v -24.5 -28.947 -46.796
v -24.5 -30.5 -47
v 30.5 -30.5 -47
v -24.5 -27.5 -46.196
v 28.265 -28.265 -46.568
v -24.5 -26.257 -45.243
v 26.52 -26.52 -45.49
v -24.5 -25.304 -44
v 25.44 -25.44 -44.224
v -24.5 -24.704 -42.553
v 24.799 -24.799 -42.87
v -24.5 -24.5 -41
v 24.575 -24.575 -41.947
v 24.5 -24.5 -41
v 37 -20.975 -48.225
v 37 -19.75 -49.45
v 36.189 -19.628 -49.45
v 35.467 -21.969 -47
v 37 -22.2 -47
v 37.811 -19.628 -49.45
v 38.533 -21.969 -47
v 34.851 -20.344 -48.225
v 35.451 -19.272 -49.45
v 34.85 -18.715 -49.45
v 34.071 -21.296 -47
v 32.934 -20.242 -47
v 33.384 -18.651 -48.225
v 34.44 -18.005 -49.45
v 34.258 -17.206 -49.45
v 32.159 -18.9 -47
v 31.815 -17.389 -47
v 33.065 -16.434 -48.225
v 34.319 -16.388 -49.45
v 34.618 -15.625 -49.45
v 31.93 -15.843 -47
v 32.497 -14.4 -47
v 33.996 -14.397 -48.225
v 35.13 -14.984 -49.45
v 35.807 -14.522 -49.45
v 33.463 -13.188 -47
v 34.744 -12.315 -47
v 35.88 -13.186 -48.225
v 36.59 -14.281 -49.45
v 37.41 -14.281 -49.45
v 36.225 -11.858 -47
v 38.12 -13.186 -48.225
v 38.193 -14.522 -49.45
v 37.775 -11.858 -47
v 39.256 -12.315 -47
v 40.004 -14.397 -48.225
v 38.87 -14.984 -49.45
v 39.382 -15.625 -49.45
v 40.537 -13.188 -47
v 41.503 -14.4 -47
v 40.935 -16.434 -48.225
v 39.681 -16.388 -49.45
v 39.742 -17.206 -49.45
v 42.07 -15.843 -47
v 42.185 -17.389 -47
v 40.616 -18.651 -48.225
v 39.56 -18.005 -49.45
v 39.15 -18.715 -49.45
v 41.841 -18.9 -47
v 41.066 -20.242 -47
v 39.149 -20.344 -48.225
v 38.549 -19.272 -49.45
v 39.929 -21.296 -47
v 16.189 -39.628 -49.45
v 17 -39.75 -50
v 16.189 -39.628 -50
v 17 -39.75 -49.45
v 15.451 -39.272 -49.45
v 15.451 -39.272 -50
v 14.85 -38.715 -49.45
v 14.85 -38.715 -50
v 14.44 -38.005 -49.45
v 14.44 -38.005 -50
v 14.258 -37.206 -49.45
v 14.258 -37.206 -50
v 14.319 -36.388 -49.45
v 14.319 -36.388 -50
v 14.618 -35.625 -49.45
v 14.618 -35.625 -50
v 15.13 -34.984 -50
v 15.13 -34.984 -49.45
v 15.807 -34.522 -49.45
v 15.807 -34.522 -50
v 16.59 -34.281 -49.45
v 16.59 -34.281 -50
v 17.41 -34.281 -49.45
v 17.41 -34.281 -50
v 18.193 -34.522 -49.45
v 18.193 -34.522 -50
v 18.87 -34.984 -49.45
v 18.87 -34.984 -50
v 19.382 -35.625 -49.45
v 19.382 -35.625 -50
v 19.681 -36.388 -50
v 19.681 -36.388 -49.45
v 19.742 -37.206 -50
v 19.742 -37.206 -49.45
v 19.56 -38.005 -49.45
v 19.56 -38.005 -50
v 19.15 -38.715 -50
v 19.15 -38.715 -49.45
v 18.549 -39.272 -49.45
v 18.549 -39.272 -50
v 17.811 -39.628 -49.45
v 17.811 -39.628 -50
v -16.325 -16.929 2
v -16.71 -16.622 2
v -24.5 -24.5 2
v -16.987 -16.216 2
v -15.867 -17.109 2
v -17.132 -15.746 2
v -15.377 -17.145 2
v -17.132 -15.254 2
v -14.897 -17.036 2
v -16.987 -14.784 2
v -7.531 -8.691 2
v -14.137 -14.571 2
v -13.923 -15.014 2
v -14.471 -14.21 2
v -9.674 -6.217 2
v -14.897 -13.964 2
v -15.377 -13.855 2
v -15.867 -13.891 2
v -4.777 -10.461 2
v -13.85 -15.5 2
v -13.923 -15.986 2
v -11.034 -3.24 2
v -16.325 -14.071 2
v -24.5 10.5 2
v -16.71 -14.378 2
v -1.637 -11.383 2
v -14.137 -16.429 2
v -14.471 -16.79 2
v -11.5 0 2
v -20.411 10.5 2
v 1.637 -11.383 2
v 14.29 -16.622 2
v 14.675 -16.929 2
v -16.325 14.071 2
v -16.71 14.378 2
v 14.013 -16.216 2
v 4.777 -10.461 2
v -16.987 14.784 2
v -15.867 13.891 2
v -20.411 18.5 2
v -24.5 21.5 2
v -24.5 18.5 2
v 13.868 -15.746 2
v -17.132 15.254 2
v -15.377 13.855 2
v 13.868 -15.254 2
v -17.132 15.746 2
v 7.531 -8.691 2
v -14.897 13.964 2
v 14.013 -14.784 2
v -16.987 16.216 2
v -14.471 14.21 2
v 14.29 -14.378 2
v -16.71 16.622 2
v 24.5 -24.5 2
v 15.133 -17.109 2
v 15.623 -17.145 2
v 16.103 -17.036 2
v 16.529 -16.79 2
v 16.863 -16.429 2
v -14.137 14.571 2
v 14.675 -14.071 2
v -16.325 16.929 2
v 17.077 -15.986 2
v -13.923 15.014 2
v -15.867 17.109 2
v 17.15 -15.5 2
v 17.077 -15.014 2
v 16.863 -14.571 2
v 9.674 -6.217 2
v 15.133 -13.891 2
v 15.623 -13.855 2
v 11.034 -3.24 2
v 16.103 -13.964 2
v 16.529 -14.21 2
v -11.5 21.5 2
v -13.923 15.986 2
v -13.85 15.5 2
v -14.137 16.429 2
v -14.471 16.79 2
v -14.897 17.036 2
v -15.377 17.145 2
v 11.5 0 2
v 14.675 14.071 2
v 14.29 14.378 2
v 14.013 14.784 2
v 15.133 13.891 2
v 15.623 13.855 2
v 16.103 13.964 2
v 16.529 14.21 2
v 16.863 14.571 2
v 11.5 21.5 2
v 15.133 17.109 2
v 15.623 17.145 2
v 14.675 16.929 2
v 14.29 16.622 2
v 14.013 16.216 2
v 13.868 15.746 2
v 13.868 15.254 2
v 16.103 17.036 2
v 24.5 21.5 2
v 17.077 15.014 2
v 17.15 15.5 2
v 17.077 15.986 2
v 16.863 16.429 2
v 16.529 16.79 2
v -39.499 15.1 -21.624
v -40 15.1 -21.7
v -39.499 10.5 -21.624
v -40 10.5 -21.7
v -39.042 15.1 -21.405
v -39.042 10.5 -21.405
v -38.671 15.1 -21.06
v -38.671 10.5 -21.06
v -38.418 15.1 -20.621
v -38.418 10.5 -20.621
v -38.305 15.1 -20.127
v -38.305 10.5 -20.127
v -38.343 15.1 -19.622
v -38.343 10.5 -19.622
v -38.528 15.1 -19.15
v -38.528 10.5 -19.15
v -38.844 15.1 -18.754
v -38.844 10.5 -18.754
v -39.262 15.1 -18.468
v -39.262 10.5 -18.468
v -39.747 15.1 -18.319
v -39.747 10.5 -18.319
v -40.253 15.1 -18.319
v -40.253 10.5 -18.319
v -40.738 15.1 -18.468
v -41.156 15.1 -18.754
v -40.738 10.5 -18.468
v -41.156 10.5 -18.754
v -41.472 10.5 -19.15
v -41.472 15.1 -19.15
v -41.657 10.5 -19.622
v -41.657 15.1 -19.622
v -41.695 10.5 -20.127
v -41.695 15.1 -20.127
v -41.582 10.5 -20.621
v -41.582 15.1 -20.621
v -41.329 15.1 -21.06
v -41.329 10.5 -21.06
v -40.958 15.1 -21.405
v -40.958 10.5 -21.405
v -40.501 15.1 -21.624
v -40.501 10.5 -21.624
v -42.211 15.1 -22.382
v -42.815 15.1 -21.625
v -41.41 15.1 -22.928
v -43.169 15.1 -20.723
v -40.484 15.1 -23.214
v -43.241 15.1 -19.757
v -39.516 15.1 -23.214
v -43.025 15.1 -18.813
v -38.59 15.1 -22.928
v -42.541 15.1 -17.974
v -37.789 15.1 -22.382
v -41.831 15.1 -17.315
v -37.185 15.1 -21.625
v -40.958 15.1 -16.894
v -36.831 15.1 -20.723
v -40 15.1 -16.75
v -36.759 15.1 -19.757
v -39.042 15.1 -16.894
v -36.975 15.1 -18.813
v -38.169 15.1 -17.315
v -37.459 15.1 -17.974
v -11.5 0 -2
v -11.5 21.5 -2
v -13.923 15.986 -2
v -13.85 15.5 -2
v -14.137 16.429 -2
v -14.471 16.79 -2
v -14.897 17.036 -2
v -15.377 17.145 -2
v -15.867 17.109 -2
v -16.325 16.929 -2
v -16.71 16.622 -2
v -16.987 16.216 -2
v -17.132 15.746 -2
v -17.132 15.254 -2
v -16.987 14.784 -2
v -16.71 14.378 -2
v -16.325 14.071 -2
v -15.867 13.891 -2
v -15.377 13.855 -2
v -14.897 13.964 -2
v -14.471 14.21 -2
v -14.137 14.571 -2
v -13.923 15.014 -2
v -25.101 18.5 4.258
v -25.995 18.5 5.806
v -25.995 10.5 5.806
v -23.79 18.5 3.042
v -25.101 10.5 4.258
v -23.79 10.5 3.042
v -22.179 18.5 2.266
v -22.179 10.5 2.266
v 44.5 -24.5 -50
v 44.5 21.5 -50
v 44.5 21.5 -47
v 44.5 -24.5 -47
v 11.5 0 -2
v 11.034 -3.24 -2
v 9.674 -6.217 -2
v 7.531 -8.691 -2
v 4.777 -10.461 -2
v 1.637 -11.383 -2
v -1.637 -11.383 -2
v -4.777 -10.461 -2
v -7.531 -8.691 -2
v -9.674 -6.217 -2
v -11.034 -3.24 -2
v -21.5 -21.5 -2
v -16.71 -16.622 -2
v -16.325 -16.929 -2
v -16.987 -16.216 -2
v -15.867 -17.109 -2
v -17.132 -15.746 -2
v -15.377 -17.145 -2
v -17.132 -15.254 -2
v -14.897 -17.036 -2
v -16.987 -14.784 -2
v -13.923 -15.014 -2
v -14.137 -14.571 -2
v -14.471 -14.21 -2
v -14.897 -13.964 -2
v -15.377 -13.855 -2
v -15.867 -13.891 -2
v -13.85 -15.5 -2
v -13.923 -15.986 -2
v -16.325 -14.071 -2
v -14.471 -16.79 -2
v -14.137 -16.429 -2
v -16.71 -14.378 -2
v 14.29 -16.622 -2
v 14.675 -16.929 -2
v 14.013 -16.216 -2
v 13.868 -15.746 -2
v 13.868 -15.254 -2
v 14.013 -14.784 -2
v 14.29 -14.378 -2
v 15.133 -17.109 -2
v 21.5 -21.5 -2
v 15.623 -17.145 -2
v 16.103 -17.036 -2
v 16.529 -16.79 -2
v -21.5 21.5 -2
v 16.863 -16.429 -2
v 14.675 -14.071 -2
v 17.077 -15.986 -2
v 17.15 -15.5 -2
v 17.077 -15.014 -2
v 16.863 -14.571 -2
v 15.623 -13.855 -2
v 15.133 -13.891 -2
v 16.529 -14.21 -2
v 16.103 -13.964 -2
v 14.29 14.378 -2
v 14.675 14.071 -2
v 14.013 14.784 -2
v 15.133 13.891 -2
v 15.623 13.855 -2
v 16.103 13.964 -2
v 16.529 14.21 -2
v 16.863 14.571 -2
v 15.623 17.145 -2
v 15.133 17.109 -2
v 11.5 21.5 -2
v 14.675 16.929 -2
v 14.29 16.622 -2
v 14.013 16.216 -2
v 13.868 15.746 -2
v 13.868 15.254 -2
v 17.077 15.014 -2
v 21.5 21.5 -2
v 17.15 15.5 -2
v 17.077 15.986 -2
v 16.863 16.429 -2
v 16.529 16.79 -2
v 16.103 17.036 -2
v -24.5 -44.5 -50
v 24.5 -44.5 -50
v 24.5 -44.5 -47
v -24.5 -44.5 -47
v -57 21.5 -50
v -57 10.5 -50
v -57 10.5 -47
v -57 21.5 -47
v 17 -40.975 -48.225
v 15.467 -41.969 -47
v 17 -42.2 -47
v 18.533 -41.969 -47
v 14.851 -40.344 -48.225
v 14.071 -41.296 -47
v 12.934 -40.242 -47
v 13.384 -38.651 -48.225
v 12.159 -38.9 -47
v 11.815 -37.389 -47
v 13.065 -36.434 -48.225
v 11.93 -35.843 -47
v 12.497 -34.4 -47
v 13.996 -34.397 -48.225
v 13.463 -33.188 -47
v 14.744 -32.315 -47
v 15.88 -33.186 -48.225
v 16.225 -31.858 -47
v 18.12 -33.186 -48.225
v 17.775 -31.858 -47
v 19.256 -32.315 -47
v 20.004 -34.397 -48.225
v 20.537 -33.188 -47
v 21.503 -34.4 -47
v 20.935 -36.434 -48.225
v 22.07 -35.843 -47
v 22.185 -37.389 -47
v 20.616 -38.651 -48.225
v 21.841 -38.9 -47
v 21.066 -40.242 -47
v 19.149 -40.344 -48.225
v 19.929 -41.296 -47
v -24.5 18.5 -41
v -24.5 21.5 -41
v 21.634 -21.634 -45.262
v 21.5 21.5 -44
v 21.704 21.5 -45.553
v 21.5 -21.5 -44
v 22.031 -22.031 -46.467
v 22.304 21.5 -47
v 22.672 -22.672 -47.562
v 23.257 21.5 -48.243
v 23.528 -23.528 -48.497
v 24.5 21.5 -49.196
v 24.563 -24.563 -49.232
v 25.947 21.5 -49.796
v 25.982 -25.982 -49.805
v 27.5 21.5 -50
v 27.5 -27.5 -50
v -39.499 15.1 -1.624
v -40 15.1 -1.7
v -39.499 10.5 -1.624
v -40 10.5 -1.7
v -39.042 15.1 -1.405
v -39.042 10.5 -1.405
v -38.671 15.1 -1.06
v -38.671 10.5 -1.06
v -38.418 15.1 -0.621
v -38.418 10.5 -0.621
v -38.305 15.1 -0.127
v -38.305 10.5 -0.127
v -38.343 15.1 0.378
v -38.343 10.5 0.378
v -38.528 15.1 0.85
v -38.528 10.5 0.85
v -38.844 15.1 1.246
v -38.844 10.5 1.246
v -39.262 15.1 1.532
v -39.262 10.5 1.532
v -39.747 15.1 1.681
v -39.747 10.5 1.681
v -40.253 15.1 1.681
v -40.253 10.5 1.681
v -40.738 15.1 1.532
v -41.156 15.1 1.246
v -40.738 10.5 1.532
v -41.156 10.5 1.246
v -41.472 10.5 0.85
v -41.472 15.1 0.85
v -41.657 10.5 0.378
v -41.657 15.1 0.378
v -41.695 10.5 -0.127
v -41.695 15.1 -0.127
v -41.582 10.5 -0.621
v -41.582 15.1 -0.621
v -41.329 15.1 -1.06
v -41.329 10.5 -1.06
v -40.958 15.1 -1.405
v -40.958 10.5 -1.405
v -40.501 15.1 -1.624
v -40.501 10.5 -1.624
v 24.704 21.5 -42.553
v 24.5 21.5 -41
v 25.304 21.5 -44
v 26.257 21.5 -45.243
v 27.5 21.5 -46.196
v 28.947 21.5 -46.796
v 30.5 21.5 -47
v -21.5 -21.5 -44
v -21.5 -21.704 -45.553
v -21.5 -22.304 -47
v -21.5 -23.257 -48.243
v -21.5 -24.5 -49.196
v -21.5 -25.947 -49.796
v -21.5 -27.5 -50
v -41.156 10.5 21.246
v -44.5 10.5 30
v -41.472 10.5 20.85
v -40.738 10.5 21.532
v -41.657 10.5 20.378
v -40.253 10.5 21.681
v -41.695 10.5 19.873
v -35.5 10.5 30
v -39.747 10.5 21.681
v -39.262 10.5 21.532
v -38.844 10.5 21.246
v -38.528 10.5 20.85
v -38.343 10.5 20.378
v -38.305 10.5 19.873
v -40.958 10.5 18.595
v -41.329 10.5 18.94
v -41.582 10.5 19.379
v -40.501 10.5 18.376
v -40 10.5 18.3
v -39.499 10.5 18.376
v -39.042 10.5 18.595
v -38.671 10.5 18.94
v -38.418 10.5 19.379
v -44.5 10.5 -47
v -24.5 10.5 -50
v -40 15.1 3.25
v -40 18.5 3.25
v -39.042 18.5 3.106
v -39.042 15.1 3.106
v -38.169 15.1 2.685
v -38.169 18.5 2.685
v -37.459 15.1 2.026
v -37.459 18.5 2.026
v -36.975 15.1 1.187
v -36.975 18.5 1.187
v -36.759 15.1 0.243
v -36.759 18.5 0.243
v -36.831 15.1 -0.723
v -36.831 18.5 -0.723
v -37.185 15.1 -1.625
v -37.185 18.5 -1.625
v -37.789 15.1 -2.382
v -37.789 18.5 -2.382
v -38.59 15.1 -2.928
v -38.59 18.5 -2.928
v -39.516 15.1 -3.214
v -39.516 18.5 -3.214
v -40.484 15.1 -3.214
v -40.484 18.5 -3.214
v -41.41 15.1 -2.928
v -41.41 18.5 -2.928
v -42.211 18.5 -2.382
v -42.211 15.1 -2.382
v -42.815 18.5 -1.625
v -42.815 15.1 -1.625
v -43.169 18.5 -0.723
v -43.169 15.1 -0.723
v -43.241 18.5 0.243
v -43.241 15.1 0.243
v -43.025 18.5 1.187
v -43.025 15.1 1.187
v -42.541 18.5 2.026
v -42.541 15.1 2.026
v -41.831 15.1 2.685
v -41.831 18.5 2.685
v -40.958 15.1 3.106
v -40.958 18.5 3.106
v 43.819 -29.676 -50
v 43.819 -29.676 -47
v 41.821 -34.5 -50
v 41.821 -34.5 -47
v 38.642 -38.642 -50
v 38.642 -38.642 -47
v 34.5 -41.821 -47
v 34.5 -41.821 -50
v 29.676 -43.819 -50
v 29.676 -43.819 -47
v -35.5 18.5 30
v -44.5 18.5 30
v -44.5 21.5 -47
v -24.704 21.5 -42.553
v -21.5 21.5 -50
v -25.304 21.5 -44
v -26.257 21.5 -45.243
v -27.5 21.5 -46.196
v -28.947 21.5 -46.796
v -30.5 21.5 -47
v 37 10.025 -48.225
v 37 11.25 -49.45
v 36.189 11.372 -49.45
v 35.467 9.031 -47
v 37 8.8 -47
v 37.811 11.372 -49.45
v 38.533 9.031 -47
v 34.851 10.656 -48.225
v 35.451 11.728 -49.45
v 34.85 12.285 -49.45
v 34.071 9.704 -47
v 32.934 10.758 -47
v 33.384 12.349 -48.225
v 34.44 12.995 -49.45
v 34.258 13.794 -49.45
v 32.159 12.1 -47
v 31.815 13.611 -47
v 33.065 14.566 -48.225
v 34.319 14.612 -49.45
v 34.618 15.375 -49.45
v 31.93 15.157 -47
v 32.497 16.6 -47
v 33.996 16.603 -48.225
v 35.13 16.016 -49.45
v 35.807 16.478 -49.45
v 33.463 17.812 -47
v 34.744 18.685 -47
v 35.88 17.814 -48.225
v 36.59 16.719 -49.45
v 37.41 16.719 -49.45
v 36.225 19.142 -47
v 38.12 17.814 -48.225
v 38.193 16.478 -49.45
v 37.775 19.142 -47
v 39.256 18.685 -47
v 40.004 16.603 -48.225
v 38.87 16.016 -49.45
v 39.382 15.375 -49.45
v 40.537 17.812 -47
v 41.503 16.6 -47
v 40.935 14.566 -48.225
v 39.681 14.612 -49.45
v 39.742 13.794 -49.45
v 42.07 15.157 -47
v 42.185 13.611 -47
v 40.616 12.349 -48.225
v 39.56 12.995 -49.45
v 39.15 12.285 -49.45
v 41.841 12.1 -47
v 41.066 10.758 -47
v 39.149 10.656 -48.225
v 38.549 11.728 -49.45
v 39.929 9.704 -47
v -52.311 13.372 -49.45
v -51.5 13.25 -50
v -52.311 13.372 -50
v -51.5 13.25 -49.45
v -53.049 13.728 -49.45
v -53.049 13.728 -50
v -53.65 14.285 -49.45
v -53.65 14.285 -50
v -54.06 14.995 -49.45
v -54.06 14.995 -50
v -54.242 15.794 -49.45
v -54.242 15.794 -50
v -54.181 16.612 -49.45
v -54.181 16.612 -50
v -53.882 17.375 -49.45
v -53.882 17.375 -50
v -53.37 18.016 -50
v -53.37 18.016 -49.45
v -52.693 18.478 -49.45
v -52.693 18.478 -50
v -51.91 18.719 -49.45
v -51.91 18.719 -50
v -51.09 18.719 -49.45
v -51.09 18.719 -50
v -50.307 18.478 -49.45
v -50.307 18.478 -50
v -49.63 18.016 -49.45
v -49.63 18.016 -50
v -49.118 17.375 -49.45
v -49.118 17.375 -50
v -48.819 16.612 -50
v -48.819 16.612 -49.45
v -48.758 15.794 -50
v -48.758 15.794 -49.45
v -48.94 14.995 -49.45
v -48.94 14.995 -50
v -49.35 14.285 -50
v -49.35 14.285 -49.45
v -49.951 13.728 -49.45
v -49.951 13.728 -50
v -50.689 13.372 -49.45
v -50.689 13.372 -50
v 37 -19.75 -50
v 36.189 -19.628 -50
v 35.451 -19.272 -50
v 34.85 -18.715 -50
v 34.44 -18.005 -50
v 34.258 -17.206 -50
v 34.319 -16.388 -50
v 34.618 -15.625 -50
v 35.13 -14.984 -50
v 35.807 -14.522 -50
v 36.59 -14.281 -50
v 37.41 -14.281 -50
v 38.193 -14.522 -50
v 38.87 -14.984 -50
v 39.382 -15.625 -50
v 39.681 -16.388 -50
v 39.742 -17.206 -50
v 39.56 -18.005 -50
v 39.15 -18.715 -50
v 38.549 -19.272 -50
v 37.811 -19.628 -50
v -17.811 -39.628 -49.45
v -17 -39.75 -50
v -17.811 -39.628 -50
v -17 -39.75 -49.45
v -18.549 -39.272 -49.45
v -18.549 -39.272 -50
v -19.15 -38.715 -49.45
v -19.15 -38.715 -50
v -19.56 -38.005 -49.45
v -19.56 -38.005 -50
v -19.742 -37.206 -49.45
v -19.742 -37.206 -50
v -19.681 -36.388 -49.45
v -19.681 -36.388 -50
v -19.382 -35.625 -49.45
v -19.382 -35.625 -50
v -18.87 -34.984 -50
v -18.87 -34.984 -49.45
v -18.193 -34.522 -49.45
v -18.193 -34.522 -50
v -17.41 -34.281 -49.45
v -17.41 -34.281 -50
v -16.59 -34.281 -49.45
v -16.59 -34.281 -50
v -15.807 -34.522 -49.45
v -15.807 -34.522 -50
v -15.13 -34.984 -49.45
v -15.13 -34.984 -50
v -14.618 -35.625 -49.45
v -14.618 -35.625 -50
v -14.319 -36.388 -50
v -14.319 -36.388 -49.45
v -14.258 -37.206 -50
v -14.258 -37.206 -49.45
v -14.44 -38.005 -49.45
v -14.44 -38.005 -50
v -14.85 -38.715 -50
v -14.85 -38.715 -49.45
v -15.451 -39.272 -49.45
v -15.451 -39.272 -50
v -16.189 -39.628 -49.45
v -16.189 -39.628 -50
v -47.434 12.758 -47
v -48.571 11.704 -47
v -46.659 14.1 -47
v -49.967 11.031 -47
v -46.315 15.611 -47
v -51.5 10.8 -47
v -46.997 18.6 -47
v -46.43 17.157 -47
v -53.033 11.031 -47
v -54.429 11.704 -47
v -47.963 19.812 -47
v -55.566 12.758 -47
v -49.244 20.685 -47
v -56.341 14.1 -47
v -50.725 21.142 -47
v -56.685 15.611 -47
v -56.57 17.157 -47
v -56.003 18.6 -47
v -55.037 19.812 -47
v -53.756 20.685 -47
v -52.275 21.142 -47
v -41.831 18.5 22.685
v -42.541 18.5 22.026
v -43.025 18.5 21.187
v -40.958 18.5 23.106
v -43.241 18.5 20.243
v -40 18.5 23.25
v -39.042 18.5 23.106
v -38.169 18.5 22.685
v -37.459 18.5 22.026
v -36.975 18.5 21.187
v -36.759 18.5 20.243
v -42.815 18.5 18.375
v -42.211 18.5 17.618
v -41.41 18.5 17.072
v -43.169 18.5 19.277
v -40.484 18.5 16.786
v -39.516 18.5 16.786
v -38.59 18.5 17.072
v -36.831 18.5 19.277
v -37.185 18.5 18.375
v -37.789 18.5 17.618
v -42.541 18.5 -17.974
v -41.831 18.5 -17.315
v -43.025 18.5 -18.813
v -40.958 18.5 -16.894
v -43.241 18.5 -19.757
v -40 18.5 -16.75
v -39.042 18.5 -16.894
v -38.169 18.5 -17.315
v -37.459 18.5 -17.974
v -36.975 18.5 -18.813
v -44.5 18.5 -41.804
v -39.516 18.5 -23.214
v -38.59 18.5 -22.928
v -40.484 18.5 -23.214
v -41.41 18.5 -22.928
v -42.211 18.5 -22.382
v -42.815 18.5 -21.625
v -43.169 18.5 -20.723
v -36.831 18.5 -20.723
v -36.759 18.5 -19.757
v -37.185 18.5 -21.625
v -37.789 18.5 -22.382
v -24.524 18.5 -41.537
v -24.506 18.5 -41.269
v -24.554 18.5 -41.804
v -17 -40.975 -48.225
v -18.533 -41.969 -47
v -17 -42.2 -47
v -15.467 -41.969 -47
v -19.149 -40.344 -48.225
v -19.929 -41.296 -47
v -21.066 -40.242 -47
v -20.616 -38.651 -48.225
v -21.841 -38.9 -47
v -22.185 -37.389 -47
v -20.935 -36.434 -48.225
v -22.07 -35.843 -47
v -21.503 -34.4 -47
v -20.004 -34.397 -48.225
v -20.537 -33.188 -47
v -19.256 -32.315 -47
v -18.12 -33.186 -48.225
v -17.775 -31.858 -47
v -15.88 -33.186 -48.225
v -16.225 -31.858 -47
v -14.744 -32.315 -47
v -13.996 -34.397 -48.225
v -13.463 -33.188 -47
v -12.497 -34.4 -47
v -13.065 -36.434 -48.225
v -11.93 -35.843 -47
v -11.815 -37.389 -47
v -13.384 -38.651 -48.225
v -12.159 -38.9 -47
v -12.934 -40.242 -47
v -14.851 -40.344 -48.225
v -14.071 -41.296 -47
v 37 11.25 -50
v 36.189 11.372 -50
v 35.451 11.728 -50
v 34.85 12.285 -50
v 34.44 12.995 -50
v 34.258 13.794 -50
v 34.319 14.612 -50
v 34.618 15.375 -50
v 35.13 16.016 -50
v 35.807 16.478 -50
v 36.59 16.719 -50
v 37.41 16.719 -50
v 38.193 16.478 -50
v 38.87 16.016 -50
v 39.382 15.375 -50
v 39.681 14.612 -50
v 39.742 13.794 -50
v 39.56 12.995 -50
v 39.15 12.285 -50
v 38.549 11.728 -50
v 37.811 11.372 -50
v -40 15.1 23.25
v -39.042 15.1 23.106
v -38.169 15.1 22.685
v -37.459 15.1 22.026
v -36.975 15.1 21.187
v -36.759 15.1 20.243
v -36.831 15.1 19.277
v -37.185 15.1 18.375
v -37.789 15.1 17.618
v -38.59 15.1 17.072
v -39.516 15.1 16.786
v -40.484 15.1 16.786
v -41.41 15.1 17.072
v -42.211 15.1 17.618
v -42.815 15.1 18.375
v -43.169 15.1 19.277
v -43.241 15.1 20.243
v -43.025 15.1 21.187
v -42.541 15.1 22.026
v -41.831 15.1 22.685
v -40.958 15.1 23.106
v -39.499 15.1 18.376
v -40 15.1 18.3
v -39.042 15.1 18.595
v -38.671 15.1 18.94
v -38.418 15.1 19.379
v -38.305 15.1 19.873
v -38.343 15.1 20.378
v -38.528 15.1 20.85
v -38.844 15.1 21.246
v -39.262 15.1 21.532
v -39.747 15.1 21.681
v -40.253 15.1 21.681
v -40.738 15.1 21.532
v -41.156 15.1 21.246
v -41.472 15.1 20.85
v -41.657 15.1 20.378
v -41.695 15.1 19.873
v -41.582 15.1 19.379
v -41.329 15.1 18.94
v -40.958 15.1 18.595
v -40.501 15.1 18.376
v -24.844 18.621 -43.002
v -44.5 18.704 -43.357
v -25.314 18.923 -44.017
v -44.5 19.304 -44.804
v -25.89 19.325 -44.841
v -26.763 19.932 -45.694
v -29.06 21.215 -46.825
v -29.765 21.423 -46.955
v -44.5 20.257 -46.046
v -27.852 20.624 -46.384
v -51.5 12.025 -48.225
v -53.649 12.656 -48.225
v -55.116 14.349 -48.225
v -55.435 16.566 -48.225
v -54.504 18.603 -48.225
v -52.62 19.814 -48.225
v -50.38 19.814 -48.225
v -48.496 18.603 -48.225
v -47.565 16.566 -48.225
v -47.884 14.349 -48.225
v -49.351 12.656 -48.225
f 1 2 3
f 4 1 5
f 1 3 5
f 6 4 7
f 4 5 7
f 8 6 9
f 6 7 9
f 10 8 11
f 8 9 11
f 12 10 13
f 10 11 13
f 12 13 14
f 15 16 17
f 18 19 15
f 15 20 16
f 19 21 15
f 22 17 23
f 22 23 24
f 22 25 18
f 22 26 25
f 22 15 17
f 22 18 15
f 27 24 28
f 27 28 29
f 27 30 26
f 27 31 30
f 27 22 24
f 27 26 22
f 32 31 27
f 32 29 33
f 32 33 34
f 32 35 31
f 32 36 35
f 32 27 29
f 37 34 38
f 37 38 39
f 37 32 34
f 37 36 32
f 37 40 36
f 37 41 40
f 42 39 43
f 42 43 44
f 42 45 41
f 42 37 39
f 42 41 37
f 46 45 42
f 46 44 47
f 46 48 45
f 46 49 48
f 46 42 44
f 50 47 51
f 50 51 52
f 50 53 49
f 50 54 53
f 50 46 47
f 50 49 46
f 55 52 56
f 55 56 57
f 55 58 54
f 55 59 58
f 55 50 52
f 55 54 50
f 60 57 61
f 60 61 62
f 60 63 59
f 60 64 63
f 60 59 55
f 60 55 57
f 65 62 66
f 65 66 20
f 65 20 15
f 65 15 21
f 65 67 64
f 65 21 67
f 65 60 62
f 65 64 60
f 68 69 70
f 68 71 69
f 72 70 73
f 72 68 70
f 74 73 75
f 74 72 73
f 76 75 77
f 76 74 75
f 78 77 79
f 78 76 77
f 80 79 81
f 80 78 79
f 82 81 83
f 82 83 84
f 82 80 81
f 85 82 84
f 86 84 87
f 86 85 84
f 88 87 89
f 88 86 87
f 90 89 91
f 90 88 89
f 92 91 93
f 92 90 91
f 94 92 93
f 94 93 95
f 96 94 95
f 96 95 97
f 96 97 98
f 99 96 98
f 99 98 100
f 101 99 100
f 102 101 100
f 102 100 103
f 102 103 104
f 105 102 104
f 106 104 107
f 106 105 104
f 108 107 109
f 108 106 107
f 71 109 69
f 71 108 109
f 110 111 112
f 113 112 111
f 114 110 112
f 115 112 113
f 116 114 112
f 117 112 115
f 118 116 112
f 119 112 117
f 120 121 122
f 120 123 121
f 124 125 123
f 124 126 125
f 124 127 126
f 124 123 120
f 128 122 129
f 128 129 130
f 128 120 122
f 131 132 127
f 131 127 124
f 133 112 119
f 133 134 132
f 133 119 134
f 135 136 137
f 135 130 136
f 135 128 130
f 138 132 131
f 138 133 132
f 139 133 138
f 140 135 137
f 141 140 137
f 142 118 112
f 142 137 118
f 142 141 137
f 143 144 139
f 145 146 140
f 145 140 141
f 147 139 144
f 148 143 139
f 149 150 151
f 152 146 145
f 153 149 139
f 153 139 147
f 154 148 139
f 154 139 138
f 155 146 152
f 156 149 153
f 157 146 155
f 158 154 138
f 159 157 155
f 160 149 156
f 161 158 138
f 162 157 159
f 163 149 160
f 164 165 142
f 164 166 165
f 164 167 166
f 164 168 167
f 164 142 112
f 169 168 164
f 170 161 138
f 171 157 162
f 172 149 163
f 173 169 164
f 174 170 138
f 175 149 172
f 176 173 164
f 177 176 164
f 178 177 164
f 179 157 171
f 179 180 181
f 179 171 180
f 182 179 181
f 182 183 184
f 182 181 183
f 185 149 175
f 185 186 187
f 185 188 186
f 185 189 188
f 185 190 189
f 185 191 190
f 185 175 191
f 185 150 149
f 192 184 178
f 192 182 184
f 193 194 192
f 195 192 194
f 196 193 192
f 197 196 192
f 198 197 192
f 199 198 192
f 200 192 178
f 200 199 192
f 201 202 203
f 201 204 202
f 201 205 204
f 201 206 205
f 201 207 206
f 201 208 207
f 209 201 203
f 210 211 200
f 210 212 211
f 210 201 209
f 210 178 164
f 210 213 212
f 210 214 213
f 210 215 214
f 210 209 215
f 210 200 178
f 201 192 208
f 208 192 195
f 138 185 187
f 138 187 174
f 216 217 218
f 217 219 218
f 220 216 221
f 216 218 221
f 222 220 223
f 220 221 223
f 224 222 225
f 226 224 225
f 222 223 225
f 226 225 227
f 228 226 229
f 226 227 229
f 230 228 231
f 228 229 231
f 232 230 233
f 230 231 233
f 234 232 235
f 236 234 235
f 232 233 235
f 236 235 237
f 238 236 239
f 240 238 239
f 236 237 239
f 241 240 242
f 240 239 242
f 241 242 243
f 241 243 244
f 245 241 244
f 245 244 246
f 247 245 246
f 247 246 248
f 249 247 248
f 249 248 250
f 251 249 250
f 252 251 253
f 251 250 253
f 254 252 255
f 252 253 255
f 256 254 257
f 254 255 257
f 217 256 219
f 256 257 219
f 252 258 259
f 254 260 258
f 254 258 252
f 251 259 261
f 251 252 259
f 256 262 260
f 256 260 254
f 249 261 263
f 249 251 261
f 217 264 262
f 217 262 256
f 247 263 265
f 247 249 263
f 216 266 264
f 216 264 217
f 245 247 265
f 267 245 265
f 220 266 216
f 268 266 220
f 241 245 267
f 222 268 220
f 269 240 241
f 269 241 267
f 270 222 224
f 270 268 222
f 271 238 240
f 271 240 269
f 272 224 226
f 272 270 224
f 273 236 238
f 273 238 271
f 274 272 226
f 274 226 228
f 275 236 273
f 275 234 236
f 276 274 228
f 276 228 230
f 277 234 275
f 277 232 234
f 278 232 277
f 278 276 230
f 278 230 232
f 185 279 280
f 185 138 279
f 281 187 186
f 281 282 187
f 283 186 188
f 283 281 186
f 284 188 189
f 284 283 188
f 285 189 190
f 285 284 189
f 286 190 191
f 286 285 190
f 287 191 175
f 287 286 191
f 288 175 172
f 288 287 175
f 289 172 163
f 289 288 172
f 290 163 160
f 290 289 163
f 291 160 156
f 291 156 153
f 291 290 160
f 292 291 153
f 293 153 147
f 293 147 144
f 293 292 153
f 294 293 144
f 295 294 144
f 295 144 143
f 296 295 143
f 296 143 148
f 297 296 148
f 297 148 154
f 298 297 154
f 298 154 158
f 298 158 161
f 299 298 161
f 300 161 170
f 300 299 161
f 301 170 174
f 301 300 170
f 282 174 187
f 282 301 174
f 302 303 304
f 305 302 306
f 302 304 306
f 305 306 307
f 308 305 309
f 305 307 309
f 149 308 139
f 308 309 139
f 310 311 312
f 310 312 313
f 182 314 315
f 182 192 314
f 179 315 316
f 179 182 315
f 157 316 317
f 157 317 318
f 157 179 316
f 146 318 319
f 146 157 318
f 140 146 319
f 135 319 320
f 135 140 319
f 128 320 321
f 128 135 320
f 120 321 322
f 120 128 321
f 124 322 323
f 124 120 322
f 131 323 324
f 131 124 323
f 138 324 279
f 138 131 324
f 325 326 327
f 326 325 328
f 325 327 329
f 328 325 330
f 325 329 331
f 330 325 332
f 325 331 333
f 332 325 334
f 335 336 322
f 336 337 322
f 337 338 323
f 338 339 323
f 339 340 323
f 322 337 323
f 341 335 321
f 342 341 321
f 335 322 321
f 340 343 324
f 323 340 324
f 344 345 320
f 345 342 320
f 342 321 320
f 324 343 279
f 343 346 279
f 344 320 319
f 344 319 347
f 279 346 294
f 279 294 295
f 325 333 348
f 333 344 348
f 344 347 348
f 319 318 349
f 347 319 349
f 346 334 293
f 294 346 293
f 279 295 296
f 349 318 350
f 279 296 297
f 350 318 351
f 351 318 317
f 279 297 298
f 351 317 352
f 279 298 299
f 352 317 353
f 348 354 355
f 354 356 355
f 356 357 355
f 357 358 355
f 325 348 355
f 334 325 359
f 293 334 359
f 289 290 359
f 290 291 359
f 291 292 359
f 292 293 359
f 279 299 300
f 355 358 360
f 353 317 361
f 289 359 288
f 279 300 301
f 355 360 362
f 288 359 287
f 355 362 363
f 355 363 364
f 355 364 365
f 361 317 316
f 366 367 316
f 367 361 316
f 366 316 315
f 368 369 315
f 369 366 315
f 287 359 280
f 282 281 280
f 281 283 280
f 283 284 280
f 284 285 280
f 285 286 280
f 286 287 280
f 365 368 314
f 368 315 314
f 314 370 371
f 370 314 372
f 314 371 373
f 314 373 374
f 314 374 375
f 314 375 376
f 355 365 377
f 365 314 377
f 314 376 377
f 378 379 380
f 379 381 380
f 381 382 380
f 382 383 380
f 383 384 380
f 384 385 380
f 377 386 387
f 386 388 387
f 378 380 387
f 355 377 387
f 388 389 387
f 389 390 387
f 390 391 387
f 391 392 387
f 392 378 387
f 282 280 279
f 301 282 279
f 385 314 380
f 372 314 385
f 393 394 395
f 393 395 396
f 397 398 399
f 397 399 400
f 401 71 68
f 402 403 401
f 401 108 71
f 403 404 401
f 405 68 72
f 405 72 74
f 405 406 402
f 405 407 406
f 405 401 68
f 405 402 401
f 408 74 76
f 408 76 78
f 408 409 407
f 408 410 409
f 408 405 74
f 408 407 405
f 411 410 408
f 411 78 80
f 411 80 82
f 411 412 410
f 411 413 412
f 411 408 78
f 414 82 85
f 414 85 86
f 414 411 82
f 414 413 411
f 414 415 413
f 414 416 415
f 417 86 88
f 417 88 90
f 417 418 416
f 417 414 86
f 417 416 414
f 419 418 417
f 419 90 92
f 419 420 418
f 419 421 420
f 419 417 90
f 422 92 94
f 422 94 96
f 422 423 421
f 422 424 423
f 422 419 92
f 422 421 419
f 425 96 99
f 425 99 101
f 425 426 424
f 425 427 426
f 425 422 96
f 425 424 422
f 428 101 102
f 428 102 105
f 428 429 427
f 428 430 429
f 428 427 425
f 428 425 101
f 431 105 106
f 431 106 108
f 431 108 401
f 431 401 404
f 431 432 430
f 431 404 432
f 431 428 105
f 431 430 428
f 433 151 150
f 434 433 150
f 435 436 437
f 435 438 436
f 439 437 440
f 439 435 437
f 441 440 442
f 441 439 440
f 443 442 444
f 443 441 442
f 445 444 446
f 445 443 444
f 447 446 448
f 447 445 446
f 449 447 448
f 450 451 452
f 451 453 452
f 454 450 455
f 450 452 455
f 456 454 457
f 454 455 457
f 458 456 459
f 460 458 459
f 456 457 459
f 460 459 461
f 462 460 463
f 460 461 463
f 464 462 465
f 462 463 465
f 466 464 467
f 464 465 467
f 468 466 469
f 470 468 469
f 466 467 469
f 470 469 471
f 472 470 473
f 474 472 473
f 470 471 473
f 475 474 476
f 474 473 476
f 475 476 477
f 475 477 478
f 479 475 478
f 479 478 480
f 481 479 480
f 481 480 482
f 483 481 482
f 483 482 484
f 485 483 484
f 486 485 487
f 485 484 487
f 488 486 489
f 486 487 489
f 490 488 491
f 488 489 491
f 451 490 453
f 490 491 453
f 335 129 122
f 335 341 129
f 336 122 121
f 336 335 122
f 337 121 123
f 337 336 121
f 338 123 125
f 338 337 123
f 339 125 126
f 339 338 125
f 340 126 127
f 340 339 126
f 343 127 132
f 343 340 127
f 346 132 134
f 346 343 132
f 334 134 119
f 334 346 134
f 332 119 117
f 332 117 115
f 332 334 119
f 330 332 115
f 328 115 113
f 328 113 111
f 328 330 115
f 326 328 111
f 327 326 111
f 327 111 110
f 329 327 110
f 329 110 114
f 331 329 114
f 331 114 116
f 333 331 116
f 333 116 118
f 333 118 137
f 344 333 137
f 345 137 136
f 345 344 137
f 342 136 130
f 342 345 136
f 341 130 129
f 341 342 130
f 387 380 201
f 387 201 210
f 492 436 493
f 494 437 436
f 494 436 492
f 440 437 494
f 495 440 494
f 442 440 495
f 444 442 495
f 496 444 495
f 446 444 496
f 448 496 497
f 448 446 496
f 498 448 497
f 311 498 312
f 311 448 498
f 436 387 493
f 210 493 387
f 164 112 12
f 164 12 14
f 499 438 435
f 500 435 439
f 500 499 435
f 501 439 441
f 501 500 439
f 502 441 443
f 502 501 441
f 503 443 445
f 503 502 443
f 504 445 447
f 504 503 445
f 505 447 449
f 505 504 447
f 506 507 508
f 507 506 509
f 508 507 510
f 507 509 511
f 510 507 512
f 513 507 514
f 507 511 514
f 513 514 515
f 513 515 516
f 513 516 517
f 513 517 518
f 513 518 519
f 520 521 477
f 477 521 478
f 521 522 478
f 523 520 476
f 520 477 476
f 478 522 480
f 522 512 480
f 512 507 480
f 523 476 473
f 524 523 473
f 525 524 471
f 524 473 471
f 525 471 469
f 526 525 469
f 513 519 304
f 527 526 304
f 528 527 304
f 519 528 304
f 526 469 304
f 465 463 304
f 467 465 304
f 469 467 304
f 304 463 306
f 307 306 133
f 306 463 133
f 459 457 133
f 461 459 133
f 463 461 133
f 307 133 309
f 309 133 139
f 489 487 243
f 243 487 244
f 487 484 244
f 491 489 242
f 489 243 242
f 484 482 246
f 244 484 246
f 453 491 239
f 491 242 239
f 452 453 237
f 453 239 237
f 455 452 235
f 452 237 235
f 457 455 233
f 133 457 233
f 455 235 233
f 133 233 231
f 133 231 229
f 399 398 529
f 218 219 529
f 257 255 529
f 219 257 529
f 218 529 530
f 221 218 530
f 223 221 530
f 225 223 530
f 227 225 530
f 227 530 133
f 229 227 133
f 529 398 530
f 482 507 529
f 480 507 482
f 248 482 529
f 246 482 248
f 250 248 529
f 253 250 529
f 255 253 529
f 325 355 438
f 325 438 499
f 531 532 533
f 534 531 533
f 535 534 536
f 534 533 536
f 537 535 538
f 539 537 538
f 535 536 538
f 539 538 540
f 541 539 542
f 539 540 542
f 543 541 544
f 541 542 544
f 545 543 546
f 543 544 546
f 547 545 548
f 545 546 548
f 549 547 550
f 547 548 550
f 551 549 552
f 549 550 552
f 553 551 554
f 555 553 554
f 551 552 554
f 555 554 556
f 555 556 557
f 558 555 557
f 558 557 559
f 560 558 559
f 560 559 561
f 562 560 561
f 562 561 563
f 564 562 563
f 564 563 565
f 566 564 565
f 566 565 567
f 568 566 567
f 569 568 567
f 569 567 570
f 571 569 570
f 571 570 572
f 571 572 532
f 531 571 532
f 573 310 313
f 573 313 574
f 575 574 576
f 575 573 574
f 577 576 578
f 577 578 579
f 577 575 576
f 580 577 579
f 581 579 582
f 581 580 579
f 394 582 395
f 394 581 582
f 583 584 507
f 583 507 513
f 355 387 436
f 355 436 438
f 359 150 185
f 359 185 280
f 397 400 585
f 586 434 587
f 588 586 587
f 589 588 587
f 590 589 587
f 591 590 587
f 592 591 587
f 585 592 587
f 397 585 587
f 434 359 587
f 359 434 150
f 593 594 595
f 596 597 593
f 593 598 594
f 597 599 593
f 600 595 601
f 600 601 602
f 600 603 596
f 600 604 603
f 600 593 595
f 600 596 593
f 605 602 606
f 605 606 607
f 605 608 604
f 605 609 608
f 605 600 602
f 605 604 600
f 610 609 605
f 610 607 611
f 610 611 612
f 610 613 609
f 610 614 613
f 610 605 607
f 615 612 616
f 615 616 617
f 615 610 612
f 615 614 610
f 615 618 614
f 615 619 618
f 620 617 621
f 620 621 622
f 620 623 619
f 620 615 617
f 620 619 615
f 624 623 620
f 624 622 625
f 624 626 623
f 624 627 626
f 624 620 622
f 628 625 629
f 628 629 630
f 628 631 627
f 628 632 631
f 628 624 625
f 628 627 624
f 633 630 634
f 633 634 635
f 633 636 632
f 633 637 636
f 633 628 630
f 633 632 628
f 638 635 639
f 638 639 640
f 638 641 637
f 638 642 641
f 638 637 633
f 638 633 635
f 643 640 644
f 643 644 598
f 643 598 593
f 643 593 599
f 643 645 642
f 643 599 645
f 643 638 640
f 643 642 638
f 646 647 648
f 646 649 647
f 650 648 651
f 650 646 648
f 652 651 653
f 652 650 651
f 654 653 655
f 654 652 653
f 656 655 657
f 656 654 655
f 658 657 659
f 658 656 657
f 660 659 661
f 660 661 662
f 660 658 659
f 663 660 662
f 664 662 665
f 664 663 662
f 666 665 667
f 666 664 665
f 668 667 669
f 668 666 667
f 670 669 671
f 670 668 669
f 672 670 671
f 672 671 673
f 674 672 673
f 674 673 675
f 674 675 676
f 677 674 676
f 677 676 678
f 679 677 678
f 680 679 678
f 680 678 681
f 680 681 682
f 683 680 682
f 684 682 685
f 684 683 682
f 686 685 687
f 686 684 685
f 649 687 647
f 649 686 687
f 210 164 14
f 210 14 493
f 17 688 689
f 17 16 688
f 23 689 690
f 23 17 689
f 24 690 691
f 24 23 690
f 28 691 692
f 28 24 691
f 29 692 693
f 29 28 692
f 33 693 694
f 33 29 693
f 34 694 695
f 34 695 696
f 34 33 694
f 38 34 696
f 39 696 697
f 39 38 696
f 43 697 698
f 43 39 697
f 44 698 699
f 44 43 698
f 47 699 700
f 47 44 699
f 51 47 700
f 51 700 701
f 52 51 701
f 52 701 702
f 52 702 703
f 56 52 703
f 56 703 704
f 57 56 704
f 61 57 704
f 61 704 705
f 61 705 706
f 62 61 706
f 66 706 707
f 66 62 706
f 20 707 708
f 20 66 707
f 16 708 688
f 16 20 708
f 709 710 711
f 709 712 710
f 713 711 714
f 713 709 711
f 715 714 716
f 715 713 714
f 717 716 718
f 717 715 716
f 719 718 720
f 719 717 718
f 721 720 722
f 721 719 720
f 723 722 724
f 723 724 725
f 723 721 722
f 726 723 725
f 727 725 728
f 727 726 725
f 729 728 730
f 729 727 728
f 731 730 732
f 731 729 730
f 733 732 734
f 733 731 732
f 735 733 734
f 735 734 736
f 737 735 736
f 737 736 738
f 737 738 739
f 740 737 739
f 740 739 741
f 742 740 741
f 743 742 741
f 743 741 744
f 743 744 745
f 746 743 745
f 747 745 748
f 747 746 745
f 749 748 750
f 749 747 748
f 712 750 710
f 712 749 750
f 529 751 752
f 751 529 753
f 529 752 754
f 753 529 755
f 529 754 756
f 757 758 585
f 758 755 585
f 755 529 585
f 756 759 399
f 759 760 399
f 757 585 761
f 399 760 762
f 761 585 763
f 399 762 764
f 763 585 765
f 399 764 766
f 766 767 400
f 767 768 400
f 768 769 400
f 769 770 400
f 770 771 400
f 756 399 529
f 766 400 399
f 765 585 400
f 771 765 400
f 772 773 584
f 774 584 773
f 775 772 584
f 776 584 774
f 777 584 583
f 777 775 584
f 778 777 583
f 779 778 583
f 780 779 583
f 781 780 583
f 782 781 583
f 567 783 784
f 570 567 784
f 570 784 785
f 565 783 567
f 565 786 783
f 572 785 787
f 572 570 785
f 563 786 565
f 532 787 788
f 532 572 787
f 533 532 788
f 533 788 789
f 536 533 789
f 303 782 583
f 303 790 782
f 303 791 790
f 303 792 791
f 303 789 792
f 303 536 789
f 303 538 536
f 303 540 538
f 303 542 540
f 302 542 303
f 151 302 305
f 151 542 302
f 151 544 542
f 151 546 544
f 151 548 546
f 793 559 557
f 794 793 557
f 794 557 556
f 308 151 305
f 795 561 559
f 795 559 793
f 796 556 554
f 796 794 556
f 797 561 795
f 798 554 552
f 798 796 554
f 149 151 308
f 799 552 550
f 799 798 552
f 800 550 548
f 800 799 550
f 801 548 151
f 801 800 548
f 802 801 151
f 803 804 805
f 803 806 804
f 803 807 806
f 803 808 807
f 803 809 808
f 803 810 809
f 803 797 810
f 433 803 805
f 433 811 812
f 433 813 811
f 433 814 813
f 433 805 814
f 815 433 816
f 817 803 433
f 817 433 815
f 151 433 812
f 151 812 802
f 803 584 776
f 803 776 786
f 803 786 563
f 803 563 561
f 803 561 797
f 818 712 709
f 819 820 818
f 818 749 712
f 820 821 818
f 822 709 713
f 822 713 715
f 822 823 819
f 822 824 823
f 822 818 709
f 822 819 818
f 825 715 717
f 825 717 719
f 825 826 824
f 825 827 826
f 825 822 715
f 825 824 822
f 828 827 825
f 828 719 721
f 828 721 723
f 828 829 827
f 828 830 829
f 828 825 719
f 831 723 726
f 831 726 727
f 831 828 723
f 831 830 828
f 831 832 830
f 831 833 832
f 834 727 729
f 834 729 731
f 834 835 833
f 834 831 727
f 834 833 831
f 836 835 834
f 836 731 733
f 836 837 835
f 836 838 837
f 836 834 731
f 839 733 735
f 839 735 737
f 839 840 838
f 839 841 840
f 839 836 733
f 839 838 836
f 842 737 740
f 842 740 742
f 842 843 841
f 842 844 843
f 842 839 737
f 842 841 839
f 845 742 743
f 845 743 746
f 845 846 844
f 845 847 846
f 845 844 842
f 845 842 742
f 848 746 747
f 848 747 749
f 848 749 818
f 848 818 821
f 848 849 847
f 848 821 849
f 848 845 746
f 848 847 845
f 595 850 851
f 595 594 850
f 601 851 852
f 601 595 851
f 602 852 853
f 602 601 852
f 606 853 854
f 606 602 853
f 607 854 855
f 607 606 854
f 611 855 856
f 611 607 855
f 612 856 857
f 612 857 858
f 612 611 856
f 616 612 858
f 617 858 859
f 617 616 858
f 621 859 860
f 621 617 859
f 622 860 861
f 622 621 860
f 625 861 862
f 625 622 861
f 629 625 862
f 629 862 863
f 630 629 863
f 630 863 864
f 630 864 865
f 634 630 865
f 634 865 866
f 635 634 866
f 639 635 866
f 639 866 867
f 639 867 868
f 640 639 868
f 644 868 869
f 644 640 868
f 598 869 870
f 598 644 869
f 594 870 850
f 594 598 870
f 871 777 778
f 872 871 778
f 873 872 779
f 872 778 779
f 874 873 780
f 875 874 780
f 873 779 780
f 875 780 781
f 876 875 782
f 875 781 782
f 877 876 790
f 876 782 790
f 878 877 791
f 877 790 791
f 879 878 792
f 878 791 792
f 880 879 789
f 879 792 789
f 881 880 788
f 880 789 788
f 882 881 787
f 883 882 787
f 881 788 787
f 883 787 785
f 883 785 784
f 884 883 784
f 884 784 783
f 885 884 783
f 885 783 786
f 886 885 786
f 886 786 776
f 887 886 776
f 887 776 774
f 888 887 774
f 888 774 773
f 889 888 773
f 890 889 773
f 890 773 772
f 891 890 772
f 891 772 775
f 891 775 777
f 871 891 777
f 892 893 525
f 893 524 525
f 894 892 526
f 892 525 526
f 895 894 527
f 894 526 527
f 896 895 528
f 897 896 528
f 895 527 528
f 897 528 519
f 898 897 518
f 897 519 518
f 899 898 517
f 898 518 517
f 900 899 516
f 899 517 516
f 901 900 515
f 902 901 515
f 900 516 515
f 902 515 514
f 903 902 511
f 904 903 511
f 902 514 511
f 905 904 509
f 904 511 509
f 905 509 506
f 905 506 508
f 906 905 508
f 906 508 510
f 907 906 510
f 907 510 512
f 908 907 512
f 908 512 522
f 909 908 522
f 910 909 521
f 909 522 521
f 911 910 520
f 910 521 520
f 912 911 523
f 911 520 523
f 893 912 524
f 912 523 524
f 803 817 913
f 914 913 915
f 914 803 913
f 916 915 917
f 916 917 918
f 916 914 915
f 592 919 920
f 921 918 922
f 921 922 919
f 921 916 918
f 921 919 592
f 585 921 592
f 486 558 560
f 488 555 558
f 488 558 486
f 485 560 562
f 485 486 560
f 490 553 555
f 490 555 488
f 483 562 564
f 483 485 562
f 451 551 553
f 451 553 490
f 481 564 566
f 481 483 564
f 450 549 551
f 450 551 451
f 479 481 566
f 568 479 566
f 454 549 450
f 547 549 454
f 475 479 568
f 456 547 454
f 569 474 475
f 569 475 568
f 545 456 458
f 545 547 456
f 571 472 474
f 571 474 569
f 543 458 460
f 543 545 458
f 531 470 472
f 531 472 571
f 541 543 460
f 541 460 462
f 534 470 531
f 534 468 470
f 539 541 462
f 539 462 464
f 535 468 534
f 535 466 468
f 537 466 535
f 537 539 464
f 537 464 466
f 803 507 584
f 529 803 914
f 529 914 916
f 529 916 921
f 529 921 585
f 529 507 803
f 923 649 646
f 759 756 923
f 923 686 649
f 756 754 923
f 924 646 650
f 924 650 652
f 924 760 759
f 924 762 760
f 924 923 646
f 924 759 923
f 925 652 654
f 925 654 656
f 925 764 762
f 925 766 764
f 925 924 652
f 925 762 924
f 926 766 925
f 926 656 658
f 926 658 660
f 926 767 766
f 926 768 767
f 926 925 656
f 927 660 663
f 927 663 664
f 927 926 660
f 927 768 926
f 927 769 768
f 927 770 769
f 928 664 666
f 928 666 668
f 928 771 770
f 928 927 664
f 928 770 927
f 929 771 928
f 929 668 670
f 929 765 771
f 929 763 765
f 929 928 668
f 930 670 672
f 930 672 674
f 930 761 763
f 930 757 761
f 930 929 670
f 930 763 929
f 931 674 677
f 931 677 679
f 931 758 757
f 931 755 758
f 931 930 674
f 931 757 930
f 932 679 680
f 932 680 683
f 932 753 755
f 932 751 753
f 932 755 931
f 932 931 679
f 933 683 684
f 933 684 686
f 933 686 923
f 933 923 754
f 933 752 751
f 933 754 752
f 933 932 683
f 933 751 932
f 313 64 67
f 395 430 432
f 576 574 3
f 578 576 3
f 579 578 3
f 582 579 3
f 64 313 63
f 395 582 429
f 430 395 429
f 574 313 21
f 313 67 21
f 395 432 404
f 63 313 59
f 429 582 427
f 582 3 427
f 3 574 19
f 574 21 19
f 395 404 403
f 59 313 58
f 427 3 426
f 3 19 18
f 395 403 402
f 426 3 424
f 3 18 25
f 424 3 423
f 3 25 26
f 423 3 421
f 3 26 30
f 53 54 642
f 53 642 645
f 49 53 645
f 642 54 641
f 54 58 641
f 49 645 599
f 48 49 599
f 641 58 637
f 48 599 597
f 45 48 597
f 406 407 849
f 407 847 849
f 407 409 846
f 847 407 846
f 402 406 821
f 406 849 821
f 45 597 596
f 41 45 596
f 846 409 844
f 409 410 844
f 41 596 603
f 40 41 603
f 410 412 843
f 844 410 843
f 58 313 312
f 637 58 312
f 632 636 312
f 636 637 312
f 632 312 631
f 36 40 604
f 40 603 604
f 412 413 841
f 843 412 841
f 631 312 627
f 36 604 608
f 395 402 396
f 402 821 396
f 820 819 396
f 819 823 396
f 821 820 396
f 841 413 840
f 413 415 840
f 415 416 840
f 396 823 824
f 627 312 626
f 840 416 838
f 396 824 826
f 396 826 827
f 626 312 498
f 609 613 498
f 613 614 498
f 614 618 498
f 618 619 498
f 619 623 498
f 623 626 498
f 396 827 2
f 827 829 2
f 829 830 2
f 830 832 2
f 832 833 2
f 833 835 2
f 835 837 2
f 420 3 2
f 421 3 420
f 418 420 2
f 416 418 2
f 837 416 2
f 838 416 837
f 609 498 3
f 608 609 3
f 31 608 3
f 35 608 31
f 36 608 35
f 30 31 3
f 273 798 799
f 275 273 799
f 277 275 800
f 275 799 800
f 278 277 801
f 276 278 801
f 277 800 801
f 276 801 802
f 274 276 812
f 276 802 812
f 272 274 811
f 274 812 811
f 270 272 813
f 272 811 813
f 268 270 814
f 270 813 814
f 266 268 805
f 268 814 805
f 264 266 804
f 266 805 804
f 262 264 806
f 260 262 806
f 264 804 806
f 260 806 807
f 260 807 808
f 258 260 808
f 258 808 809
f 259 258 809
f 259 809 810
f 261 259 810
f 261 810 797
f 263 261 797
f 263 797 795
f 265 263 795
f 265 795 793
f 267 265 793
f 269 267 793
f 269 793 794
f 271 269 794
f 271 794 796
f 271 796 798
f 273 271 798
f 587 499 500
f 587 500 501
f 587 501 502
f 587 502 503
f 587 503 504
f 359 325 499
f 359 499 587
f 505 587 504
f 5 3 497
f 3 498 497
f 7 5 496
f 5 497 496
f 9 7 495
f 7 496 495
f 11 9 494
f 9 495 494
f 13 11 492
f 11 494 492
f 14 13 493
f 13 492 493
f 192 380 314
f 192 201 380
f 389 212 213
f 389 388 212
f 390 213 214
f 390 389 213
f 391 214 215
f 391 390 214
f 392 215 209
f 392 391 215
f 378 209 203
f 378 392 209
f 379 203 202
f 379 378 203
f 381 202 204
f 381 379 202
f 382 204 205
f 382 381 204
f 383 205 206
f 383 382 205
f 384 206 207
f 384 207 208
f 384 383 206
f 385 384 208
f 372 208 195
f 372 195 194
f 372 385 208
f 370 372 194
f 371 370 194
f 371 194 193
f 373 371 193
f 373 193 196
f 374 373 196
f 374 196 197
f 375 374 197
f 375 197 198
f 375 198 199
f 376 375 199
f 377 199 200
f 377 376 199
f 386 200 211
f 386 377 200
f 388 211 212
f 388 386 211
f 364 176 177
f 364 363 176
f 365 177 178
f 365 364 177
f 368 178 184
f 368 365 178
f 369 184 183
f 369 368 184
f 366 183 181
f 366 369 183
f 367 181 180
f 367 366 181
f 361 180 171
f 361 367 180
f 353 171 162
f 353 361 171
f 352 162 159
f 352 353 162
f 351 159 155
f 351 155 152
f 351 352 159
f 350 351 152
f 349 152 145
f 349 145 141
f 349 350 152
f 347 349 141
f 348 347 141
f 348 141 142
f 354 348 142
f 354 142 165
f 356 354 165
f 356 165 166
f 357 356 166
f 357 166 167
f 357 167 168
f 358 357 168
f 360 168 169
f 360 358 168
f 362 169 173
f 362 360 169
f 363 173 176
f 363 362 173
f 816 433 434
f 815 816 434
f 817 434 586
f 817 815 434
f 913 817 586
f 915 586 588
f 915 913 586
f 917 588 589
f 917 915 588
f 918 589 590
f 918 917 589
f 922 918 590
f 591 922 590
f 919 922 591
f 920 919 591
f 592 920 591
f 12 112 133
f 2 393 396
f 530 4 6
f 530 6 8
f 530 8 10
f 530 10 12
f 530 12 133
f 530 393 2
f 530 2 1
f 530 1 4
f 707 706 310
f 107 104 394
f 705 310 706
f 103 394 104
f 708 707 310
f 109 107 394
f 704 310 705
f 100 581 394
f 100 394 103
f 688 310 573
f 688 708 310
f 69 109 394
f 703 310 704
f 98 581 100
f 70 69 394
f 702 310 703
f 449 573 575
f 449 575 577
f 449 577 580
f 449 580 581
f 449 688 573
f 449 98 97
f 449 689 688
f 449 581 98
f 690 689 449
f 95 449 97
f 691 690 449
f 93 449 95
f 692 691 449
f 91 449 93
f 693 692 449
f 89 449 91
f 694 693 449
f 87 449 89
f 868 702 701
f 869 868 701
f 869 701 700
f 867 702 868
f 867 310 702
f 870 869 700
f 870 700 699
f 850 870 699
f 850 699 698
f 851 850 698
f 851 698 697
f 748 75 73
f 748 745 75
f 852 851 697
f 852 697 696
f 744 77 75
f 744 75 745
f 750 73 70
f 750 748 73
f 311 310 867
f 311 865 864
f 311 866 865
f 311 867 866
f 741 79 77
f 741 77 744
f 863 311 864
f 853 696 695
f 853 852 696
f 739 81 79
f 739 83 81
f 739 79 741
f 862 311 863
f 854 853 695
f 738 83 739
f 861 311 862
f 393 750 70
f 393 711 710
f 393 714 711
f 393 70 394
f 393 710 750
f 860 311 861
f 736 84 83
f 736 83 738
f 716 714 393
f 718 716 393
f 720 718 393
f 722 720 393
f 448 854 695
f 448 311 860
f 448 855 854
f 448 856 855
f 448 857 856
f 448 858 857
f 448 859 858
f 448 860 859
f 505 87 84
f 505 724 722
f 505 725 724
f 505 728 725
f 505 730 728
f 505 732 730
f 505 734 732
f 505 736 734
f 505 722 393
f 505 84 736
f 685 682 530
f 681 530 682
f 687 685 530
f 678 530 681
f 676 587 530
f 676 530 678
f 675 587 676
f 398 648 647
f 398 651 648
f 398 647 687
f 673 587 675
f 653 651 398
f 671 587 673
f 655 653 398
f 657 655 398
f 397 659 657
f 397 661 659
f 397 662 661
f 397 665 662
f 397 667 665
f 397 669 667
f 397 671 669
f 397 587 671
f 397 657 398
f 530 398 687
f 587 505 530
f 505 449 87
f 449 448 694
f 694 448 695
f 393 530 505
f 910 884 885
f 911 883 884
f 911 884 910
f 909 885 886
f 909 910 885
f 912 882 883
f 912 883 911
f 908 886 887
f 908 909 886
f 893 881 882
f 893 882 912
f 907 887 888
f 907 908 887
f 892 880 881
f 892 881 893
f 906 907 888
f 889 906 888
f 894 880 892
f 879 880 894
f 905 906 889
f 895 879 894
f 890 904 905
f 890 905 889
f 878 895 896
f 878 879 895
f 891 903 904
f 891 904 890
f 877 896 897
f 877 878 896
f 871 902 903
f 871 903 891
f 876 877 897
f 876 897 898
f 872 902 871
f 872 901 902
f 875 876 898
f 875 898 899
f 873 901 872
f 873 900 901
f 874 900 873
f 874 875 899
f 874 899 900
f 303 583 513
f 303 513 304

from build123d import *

# Parameters (mm, degrees)
ESQUISSE1_R                                       = 1.65
BOSS_EXTRU_1_DEPTH                                = 2
BOSS_EXTRU_2_DEPTH                                = 48
BOSS_EXTRU_3_DEPTH                                = 3
CONG_1_R                                          = 6
ESQUISSE6_W                                       = 52
ESQUISSE6_H                                       = 8
BOSS_EXTRU_4_DEPTH                                = 20
BOSS_EXTRU_5_DEPTH                                = 8
ESQUISSE8_W                                       = 32.5
ESQUISSE8_H                                       = 11
BOSS_EXTRU_7_DEPTH                                = 3
FRAISAGE_POUR_VIS_T_TE_FRAIS_E_M51_AT_COUNT       = 2
FRAISAGE_POUR_VIS_T_TE_FRAIS_E_M51_AT_PITCH       = 57.584720196
FRAISAGE_POUR_VIS_T_TE_FRAIS_E_M51_2_COUNT        = 2
FRAISAGE_POUR_VIS_T_TE_FRAIS_E_M51_2_PITCH        = 74.276510419
FRAISAGE_POUR_VIS_T_TE_FRAIS_E_M51_3_COUNT        = 2
FRAISAGE_POUR_VIS_T_TE_FRAIS_E_M51_3_PITCH        = 34
FRAISAGE_POUR_VIS_T_TE_FRAIS_E_M51_4_COUNT        = 2
FRAISAGE_POUR_VIS_T_TE_FRAIS_E_M51_4_PITCH        = 63.239623655
CONG_3_R                                          = 6
CONG_4_R                                          = 6
CHAMBRAGE_POUR_VIS_SIX_PANS_CREUX_M31_D           = 3.4
CHAMBRAGE_POUR_VIS_SIX_PANS_CREUX_M31_CBORE_D     = 6.5
CHAMBRAGE_POUR_VIS_SIX_PANS_CREUX_M31_CBORE_DEPTH = 3.4


with BuildPart() as part:
    # Esquisse1 → Boss.-Extru.1 (new, symmetric)
    with BuildSketch(Plane.XY):
        with BuildLine():
            Line((-11.5, 0), (-11.5, 21.5))
            Line((-11.5, 21.5), (-24.5, 21.5))
            Line((-24.5, 21.5), (-24.5, -24.5))
            Line((-24.5, -24.5), (24.5, -24.5))
            Line((24.5, -24.5), (24.5, 21.5))
            Line((24.5, 21.5), (11.5, 21.5))
            Line((11.5, 21.5), (11.5, 0))
            ThreePointArc((11.5, 0), (0, -11.5), (-11.5, 0))
        make_face()
        with Locations((-15.5, 15.5)):
            Circle(ESQUISSE1_R, mode=Mode.SUBTRACT)
        with Locations((15.5, 15.5)):
            Circle(ESQUISSE1_R, mode=Mode.SUBTRACT)
        with Locations((15.5, -15.5)):
            Circle(ESQUISSE1_R, mode=Mode.SUBTRACT)
        with Locations((-15.5, -15.5)):
            Circle(ESQUISSE1_R, mode=Mode.SUBTRACT)
    extrude(amount=BOSS_EXTRU_1_DEPTH, both=True)

    # Esquisse2 → Boss.-Extru.2 (add)
    with BuildSketch(Plane(origin=(0, 0, -2), x_dir=(-1, 0, 0), z_dir=(0, 0, -1))):
        Polygon((-24.5, 21.5), (-21.5, 21.5), (-21.5, -21.5), (21.5, -21.5), (21.5, 21.5), (24.5, 21.5), (24.5, -24.5), (-24.5, -24.5), align=None)
    extrude(amount=BOSS_EXTRU_2_DEPTH)

    # Esquisse4 → Boss.-Extru.3 (add)
    with BuildSketch(Plane(origin=(0, 0, -50), x_dir=(-1, 0, 0), z_dir=(0, 0, -1))):
        with BuildLine():
            Line((-24.5, 21.5), (-44.5, 21.5))
            Line((-44.5, 21.5), (-44.5, -24.5))
            ThreePointArc((-44.5, -24.5), (-38.642135624, -38.642135624), (-24.5, -44.5))
            Line((-24.5, -44.5), (24.5, -44.5))
            Line((24.5, -44.5), (24.5, -24.5))
            Line((24.5, -24.5), (-24.5, -24.5))
            Line((-24.5, -24.5), (-24.5, 21.5))
        make_face()
    extrude(amount=-BOSS_EXTRU_3_DEPTH)

    # Congé1
    cong_1_edges = [part.edges().sort_by_distance(p)[0] for p in [
        (0, -21.5, -50),
        (21.5, 0, -50),
        (24.5, -1.5, -47),
        (0, -24.5, -47),
    ]]
    fillet(cong_1_edges, radius=CONG_1_R)

    # Esquisse6 → Boss.-Extru.4 (add)
    with BuildSketch(Plane.ZY.offset(24.5)):
        with Locations((-24, 14.5)):
            Rectangle(ESQUISSE6_W, ESQUISSE6_H)
    extrude(amount=BOSS_EXTRU_4_DEPTH)

    # Esquisse7 → Boss.-Extru.5 (add)
    with BuildSketch(Plane(origin=(0, 18.5, 0), x_dir=(1, 0, 0), z_dir=(0, 1, 0))):
        Polygon((-44.5, -2), (-44.5, -30), (-35.5, -30), (-24.5, -2), align=None)
    extrude(amount=-BOSS_EXTRU_5_DEPTH)

    # Esquisse8 → Boss.-Extru.7 (add)
    with BuildSketch(Plane(origin=(0, 0, -50), x_dir=(-1, 0, 0), z_dir=(0, 0, -1))):
        with Locations((40.75, 16)):
            Rectangle(ESQUISSE8_W, ESQUISSE8_H)
    extrude(amount=-BOSS_EXTRU_7_DEPTH)

    # Esquisse5 → Fraisage pour vis à tête fraisée M51 (revolve, cut)
    with BuildSketch(Plane(origin=(-17, -37, -47), x_dir=(0, -1, 0), z_dir=(1, 0, 0))):
        Polygon((0, 0), (0, 3), (2.75, 3), (2.75, 2.45), (5.2, 0), align=None)
    fraisage_pour_vis_t_te_frais_e_m51 = revolve(axis=Axis((-17, -37, -40.65), (0, 0, -1)), mode=Mode.SUBTRACT)

    # Fraisage pour vis à tête fraisée M51 at: Fraisage pour vis à tête fraisée M51 ×2
    with Locations(*[Vector(0.9377487607237037, 0.3473143558235938, 0) * (i * FRAISAGE_POUR_VIS_T_TE_FRAIS_E_M51_AT_PITCH) for i in range(1, FRAISAGE_POUR_VIS_T_TE_FRAIS_E_M51_AT_COUNT)]):
        add(fraisage_pour_vis_t_te_frais_e_m51, mode=Mode.SUBTRACT)

    # Fraisage pour vis _ t_te frais_e M51 2: Fraisage pour vis à tête fraisée M51 ×2
    with Locations(*[Vector(0.7270131525498176, 0.6866235329637164, 0) * (i * FRAISAGE_POUR_VIS_T_TE_FRAIS_E_M51_2_PITCH) for i in range(1, FRAISAGE_POUR_VIS_T_TE_FRAIS_E_M51_2_COUNT)]):
        add(fraisage_pour_vis_t_te_frais_e_m51, mode=Mode.SUBTRACT)

    # Fraisage pour vis _ t_te frais_e M51 3: Fraisage pour vis à tête fraisée M51 ×2
    with Locations(*[(i * FRAISAGE_POUR_VIS_T_TE_FRAIS_E_M51_3_PITCH, 0, 0) for i in range(1, FRAISAGE_POUR_VIS_T_TE_FRAIS_E_M51_3_COUNT)]):
        add(fraisage_pour_vis_t_te_frais_e_m51, mode=Mode.SUBTRACT)

    # Fraisage pour vis _ t_te frais_e M51 4: Fraisage pour vis à tête fraisée M51 ×2
    with Locations(*[Vector(-0.5455440435307616, 0.8380821538298656, 0) * (i * FRAISAGE_POUR_VIS_T_TE_FRAIS_E_M51_4_PITCH) for i in range(1, FRAISAGE_POUR_VIS_T_TE_FRAIS_E_M51_4_COUNT)]):
        add(fraisage_pour_vis_t_te_frais_e_m51, mode=Mode.SUBTRACT)

    # Congé3
    # the kernel refuses this fillet: 6 mm, written as the material it adds along each edge
    with BuildSketch(Plane(origin=(-44.5, 18.5, -47), x_dir=(0, 0, 1), z_dir=(1, 0, 0))) as cong_3_piece_1_section:
        with BuildLine():
            CenterArc((5.196152423, -6), CONG_3_R, 90, 60)
            Line((0, -3), (0, 0))
            Line((0, 0), (5.196152423, 0))
        make_face()
    cong_3_piece_1 = extrude(amount=32.990381057, mode=Mode.PRIVATE)
    cong_3_piece_1 = split(cong_3_piece_1, bisect_by=Plane(origin=(-21.5, 18.653513823, -43.204827013), z_dir=(-1, 0, 0)), keep=Keep.TOP, mode=Mode.PRIVATE)
    add(cong_3_piece_1)
    with BuildSketch(Plane(origin=(-24.5, 18.5, -47), x_dir=(0, 0, 1), z_dir=(0, 1, 0))) as cong_3_piece_2:
        with BuildLine():
            CenterArc((CONG_3_R, -CONG_3_R), CONG_3_R, 90, 90)
            Line((0, -CONG_3_R), (0, 0))
            Line((0, 0), (CONG_3_R, 0))
        make_face()
    extrude(amount=3)

    # Congé4
    cong_4_edges = [part.edges().sort_by_distance(p)[0] for p in [
        (-24.5, 14.5, 2),
    ]]
    fillet(cong_4_edges, radius=CONG_4_R)

    # Chambrage pour vis à six pans creux M31 (through all)
    with Locations(Plane(origin=(-40, 18.5, -20), x_dir=(0, 0, 1), z_dir=(0, 1, 0))):
        with Locations((0, 0), (20, 0), (40, 0)):
            CounterBoreHole(CHAMBRAGE_POUR_VIS_SIX_PANS_CREUX_M31_D / 2, CHAMBRAGE_POUR_VIS_SIX_PANS_CREUX_M31_CBORE_D / 2, CHAMBRAGE_POUR_VIS_SIX_PANS_CREUX_M31_CBORE_DEPTH)


solid = part.part
